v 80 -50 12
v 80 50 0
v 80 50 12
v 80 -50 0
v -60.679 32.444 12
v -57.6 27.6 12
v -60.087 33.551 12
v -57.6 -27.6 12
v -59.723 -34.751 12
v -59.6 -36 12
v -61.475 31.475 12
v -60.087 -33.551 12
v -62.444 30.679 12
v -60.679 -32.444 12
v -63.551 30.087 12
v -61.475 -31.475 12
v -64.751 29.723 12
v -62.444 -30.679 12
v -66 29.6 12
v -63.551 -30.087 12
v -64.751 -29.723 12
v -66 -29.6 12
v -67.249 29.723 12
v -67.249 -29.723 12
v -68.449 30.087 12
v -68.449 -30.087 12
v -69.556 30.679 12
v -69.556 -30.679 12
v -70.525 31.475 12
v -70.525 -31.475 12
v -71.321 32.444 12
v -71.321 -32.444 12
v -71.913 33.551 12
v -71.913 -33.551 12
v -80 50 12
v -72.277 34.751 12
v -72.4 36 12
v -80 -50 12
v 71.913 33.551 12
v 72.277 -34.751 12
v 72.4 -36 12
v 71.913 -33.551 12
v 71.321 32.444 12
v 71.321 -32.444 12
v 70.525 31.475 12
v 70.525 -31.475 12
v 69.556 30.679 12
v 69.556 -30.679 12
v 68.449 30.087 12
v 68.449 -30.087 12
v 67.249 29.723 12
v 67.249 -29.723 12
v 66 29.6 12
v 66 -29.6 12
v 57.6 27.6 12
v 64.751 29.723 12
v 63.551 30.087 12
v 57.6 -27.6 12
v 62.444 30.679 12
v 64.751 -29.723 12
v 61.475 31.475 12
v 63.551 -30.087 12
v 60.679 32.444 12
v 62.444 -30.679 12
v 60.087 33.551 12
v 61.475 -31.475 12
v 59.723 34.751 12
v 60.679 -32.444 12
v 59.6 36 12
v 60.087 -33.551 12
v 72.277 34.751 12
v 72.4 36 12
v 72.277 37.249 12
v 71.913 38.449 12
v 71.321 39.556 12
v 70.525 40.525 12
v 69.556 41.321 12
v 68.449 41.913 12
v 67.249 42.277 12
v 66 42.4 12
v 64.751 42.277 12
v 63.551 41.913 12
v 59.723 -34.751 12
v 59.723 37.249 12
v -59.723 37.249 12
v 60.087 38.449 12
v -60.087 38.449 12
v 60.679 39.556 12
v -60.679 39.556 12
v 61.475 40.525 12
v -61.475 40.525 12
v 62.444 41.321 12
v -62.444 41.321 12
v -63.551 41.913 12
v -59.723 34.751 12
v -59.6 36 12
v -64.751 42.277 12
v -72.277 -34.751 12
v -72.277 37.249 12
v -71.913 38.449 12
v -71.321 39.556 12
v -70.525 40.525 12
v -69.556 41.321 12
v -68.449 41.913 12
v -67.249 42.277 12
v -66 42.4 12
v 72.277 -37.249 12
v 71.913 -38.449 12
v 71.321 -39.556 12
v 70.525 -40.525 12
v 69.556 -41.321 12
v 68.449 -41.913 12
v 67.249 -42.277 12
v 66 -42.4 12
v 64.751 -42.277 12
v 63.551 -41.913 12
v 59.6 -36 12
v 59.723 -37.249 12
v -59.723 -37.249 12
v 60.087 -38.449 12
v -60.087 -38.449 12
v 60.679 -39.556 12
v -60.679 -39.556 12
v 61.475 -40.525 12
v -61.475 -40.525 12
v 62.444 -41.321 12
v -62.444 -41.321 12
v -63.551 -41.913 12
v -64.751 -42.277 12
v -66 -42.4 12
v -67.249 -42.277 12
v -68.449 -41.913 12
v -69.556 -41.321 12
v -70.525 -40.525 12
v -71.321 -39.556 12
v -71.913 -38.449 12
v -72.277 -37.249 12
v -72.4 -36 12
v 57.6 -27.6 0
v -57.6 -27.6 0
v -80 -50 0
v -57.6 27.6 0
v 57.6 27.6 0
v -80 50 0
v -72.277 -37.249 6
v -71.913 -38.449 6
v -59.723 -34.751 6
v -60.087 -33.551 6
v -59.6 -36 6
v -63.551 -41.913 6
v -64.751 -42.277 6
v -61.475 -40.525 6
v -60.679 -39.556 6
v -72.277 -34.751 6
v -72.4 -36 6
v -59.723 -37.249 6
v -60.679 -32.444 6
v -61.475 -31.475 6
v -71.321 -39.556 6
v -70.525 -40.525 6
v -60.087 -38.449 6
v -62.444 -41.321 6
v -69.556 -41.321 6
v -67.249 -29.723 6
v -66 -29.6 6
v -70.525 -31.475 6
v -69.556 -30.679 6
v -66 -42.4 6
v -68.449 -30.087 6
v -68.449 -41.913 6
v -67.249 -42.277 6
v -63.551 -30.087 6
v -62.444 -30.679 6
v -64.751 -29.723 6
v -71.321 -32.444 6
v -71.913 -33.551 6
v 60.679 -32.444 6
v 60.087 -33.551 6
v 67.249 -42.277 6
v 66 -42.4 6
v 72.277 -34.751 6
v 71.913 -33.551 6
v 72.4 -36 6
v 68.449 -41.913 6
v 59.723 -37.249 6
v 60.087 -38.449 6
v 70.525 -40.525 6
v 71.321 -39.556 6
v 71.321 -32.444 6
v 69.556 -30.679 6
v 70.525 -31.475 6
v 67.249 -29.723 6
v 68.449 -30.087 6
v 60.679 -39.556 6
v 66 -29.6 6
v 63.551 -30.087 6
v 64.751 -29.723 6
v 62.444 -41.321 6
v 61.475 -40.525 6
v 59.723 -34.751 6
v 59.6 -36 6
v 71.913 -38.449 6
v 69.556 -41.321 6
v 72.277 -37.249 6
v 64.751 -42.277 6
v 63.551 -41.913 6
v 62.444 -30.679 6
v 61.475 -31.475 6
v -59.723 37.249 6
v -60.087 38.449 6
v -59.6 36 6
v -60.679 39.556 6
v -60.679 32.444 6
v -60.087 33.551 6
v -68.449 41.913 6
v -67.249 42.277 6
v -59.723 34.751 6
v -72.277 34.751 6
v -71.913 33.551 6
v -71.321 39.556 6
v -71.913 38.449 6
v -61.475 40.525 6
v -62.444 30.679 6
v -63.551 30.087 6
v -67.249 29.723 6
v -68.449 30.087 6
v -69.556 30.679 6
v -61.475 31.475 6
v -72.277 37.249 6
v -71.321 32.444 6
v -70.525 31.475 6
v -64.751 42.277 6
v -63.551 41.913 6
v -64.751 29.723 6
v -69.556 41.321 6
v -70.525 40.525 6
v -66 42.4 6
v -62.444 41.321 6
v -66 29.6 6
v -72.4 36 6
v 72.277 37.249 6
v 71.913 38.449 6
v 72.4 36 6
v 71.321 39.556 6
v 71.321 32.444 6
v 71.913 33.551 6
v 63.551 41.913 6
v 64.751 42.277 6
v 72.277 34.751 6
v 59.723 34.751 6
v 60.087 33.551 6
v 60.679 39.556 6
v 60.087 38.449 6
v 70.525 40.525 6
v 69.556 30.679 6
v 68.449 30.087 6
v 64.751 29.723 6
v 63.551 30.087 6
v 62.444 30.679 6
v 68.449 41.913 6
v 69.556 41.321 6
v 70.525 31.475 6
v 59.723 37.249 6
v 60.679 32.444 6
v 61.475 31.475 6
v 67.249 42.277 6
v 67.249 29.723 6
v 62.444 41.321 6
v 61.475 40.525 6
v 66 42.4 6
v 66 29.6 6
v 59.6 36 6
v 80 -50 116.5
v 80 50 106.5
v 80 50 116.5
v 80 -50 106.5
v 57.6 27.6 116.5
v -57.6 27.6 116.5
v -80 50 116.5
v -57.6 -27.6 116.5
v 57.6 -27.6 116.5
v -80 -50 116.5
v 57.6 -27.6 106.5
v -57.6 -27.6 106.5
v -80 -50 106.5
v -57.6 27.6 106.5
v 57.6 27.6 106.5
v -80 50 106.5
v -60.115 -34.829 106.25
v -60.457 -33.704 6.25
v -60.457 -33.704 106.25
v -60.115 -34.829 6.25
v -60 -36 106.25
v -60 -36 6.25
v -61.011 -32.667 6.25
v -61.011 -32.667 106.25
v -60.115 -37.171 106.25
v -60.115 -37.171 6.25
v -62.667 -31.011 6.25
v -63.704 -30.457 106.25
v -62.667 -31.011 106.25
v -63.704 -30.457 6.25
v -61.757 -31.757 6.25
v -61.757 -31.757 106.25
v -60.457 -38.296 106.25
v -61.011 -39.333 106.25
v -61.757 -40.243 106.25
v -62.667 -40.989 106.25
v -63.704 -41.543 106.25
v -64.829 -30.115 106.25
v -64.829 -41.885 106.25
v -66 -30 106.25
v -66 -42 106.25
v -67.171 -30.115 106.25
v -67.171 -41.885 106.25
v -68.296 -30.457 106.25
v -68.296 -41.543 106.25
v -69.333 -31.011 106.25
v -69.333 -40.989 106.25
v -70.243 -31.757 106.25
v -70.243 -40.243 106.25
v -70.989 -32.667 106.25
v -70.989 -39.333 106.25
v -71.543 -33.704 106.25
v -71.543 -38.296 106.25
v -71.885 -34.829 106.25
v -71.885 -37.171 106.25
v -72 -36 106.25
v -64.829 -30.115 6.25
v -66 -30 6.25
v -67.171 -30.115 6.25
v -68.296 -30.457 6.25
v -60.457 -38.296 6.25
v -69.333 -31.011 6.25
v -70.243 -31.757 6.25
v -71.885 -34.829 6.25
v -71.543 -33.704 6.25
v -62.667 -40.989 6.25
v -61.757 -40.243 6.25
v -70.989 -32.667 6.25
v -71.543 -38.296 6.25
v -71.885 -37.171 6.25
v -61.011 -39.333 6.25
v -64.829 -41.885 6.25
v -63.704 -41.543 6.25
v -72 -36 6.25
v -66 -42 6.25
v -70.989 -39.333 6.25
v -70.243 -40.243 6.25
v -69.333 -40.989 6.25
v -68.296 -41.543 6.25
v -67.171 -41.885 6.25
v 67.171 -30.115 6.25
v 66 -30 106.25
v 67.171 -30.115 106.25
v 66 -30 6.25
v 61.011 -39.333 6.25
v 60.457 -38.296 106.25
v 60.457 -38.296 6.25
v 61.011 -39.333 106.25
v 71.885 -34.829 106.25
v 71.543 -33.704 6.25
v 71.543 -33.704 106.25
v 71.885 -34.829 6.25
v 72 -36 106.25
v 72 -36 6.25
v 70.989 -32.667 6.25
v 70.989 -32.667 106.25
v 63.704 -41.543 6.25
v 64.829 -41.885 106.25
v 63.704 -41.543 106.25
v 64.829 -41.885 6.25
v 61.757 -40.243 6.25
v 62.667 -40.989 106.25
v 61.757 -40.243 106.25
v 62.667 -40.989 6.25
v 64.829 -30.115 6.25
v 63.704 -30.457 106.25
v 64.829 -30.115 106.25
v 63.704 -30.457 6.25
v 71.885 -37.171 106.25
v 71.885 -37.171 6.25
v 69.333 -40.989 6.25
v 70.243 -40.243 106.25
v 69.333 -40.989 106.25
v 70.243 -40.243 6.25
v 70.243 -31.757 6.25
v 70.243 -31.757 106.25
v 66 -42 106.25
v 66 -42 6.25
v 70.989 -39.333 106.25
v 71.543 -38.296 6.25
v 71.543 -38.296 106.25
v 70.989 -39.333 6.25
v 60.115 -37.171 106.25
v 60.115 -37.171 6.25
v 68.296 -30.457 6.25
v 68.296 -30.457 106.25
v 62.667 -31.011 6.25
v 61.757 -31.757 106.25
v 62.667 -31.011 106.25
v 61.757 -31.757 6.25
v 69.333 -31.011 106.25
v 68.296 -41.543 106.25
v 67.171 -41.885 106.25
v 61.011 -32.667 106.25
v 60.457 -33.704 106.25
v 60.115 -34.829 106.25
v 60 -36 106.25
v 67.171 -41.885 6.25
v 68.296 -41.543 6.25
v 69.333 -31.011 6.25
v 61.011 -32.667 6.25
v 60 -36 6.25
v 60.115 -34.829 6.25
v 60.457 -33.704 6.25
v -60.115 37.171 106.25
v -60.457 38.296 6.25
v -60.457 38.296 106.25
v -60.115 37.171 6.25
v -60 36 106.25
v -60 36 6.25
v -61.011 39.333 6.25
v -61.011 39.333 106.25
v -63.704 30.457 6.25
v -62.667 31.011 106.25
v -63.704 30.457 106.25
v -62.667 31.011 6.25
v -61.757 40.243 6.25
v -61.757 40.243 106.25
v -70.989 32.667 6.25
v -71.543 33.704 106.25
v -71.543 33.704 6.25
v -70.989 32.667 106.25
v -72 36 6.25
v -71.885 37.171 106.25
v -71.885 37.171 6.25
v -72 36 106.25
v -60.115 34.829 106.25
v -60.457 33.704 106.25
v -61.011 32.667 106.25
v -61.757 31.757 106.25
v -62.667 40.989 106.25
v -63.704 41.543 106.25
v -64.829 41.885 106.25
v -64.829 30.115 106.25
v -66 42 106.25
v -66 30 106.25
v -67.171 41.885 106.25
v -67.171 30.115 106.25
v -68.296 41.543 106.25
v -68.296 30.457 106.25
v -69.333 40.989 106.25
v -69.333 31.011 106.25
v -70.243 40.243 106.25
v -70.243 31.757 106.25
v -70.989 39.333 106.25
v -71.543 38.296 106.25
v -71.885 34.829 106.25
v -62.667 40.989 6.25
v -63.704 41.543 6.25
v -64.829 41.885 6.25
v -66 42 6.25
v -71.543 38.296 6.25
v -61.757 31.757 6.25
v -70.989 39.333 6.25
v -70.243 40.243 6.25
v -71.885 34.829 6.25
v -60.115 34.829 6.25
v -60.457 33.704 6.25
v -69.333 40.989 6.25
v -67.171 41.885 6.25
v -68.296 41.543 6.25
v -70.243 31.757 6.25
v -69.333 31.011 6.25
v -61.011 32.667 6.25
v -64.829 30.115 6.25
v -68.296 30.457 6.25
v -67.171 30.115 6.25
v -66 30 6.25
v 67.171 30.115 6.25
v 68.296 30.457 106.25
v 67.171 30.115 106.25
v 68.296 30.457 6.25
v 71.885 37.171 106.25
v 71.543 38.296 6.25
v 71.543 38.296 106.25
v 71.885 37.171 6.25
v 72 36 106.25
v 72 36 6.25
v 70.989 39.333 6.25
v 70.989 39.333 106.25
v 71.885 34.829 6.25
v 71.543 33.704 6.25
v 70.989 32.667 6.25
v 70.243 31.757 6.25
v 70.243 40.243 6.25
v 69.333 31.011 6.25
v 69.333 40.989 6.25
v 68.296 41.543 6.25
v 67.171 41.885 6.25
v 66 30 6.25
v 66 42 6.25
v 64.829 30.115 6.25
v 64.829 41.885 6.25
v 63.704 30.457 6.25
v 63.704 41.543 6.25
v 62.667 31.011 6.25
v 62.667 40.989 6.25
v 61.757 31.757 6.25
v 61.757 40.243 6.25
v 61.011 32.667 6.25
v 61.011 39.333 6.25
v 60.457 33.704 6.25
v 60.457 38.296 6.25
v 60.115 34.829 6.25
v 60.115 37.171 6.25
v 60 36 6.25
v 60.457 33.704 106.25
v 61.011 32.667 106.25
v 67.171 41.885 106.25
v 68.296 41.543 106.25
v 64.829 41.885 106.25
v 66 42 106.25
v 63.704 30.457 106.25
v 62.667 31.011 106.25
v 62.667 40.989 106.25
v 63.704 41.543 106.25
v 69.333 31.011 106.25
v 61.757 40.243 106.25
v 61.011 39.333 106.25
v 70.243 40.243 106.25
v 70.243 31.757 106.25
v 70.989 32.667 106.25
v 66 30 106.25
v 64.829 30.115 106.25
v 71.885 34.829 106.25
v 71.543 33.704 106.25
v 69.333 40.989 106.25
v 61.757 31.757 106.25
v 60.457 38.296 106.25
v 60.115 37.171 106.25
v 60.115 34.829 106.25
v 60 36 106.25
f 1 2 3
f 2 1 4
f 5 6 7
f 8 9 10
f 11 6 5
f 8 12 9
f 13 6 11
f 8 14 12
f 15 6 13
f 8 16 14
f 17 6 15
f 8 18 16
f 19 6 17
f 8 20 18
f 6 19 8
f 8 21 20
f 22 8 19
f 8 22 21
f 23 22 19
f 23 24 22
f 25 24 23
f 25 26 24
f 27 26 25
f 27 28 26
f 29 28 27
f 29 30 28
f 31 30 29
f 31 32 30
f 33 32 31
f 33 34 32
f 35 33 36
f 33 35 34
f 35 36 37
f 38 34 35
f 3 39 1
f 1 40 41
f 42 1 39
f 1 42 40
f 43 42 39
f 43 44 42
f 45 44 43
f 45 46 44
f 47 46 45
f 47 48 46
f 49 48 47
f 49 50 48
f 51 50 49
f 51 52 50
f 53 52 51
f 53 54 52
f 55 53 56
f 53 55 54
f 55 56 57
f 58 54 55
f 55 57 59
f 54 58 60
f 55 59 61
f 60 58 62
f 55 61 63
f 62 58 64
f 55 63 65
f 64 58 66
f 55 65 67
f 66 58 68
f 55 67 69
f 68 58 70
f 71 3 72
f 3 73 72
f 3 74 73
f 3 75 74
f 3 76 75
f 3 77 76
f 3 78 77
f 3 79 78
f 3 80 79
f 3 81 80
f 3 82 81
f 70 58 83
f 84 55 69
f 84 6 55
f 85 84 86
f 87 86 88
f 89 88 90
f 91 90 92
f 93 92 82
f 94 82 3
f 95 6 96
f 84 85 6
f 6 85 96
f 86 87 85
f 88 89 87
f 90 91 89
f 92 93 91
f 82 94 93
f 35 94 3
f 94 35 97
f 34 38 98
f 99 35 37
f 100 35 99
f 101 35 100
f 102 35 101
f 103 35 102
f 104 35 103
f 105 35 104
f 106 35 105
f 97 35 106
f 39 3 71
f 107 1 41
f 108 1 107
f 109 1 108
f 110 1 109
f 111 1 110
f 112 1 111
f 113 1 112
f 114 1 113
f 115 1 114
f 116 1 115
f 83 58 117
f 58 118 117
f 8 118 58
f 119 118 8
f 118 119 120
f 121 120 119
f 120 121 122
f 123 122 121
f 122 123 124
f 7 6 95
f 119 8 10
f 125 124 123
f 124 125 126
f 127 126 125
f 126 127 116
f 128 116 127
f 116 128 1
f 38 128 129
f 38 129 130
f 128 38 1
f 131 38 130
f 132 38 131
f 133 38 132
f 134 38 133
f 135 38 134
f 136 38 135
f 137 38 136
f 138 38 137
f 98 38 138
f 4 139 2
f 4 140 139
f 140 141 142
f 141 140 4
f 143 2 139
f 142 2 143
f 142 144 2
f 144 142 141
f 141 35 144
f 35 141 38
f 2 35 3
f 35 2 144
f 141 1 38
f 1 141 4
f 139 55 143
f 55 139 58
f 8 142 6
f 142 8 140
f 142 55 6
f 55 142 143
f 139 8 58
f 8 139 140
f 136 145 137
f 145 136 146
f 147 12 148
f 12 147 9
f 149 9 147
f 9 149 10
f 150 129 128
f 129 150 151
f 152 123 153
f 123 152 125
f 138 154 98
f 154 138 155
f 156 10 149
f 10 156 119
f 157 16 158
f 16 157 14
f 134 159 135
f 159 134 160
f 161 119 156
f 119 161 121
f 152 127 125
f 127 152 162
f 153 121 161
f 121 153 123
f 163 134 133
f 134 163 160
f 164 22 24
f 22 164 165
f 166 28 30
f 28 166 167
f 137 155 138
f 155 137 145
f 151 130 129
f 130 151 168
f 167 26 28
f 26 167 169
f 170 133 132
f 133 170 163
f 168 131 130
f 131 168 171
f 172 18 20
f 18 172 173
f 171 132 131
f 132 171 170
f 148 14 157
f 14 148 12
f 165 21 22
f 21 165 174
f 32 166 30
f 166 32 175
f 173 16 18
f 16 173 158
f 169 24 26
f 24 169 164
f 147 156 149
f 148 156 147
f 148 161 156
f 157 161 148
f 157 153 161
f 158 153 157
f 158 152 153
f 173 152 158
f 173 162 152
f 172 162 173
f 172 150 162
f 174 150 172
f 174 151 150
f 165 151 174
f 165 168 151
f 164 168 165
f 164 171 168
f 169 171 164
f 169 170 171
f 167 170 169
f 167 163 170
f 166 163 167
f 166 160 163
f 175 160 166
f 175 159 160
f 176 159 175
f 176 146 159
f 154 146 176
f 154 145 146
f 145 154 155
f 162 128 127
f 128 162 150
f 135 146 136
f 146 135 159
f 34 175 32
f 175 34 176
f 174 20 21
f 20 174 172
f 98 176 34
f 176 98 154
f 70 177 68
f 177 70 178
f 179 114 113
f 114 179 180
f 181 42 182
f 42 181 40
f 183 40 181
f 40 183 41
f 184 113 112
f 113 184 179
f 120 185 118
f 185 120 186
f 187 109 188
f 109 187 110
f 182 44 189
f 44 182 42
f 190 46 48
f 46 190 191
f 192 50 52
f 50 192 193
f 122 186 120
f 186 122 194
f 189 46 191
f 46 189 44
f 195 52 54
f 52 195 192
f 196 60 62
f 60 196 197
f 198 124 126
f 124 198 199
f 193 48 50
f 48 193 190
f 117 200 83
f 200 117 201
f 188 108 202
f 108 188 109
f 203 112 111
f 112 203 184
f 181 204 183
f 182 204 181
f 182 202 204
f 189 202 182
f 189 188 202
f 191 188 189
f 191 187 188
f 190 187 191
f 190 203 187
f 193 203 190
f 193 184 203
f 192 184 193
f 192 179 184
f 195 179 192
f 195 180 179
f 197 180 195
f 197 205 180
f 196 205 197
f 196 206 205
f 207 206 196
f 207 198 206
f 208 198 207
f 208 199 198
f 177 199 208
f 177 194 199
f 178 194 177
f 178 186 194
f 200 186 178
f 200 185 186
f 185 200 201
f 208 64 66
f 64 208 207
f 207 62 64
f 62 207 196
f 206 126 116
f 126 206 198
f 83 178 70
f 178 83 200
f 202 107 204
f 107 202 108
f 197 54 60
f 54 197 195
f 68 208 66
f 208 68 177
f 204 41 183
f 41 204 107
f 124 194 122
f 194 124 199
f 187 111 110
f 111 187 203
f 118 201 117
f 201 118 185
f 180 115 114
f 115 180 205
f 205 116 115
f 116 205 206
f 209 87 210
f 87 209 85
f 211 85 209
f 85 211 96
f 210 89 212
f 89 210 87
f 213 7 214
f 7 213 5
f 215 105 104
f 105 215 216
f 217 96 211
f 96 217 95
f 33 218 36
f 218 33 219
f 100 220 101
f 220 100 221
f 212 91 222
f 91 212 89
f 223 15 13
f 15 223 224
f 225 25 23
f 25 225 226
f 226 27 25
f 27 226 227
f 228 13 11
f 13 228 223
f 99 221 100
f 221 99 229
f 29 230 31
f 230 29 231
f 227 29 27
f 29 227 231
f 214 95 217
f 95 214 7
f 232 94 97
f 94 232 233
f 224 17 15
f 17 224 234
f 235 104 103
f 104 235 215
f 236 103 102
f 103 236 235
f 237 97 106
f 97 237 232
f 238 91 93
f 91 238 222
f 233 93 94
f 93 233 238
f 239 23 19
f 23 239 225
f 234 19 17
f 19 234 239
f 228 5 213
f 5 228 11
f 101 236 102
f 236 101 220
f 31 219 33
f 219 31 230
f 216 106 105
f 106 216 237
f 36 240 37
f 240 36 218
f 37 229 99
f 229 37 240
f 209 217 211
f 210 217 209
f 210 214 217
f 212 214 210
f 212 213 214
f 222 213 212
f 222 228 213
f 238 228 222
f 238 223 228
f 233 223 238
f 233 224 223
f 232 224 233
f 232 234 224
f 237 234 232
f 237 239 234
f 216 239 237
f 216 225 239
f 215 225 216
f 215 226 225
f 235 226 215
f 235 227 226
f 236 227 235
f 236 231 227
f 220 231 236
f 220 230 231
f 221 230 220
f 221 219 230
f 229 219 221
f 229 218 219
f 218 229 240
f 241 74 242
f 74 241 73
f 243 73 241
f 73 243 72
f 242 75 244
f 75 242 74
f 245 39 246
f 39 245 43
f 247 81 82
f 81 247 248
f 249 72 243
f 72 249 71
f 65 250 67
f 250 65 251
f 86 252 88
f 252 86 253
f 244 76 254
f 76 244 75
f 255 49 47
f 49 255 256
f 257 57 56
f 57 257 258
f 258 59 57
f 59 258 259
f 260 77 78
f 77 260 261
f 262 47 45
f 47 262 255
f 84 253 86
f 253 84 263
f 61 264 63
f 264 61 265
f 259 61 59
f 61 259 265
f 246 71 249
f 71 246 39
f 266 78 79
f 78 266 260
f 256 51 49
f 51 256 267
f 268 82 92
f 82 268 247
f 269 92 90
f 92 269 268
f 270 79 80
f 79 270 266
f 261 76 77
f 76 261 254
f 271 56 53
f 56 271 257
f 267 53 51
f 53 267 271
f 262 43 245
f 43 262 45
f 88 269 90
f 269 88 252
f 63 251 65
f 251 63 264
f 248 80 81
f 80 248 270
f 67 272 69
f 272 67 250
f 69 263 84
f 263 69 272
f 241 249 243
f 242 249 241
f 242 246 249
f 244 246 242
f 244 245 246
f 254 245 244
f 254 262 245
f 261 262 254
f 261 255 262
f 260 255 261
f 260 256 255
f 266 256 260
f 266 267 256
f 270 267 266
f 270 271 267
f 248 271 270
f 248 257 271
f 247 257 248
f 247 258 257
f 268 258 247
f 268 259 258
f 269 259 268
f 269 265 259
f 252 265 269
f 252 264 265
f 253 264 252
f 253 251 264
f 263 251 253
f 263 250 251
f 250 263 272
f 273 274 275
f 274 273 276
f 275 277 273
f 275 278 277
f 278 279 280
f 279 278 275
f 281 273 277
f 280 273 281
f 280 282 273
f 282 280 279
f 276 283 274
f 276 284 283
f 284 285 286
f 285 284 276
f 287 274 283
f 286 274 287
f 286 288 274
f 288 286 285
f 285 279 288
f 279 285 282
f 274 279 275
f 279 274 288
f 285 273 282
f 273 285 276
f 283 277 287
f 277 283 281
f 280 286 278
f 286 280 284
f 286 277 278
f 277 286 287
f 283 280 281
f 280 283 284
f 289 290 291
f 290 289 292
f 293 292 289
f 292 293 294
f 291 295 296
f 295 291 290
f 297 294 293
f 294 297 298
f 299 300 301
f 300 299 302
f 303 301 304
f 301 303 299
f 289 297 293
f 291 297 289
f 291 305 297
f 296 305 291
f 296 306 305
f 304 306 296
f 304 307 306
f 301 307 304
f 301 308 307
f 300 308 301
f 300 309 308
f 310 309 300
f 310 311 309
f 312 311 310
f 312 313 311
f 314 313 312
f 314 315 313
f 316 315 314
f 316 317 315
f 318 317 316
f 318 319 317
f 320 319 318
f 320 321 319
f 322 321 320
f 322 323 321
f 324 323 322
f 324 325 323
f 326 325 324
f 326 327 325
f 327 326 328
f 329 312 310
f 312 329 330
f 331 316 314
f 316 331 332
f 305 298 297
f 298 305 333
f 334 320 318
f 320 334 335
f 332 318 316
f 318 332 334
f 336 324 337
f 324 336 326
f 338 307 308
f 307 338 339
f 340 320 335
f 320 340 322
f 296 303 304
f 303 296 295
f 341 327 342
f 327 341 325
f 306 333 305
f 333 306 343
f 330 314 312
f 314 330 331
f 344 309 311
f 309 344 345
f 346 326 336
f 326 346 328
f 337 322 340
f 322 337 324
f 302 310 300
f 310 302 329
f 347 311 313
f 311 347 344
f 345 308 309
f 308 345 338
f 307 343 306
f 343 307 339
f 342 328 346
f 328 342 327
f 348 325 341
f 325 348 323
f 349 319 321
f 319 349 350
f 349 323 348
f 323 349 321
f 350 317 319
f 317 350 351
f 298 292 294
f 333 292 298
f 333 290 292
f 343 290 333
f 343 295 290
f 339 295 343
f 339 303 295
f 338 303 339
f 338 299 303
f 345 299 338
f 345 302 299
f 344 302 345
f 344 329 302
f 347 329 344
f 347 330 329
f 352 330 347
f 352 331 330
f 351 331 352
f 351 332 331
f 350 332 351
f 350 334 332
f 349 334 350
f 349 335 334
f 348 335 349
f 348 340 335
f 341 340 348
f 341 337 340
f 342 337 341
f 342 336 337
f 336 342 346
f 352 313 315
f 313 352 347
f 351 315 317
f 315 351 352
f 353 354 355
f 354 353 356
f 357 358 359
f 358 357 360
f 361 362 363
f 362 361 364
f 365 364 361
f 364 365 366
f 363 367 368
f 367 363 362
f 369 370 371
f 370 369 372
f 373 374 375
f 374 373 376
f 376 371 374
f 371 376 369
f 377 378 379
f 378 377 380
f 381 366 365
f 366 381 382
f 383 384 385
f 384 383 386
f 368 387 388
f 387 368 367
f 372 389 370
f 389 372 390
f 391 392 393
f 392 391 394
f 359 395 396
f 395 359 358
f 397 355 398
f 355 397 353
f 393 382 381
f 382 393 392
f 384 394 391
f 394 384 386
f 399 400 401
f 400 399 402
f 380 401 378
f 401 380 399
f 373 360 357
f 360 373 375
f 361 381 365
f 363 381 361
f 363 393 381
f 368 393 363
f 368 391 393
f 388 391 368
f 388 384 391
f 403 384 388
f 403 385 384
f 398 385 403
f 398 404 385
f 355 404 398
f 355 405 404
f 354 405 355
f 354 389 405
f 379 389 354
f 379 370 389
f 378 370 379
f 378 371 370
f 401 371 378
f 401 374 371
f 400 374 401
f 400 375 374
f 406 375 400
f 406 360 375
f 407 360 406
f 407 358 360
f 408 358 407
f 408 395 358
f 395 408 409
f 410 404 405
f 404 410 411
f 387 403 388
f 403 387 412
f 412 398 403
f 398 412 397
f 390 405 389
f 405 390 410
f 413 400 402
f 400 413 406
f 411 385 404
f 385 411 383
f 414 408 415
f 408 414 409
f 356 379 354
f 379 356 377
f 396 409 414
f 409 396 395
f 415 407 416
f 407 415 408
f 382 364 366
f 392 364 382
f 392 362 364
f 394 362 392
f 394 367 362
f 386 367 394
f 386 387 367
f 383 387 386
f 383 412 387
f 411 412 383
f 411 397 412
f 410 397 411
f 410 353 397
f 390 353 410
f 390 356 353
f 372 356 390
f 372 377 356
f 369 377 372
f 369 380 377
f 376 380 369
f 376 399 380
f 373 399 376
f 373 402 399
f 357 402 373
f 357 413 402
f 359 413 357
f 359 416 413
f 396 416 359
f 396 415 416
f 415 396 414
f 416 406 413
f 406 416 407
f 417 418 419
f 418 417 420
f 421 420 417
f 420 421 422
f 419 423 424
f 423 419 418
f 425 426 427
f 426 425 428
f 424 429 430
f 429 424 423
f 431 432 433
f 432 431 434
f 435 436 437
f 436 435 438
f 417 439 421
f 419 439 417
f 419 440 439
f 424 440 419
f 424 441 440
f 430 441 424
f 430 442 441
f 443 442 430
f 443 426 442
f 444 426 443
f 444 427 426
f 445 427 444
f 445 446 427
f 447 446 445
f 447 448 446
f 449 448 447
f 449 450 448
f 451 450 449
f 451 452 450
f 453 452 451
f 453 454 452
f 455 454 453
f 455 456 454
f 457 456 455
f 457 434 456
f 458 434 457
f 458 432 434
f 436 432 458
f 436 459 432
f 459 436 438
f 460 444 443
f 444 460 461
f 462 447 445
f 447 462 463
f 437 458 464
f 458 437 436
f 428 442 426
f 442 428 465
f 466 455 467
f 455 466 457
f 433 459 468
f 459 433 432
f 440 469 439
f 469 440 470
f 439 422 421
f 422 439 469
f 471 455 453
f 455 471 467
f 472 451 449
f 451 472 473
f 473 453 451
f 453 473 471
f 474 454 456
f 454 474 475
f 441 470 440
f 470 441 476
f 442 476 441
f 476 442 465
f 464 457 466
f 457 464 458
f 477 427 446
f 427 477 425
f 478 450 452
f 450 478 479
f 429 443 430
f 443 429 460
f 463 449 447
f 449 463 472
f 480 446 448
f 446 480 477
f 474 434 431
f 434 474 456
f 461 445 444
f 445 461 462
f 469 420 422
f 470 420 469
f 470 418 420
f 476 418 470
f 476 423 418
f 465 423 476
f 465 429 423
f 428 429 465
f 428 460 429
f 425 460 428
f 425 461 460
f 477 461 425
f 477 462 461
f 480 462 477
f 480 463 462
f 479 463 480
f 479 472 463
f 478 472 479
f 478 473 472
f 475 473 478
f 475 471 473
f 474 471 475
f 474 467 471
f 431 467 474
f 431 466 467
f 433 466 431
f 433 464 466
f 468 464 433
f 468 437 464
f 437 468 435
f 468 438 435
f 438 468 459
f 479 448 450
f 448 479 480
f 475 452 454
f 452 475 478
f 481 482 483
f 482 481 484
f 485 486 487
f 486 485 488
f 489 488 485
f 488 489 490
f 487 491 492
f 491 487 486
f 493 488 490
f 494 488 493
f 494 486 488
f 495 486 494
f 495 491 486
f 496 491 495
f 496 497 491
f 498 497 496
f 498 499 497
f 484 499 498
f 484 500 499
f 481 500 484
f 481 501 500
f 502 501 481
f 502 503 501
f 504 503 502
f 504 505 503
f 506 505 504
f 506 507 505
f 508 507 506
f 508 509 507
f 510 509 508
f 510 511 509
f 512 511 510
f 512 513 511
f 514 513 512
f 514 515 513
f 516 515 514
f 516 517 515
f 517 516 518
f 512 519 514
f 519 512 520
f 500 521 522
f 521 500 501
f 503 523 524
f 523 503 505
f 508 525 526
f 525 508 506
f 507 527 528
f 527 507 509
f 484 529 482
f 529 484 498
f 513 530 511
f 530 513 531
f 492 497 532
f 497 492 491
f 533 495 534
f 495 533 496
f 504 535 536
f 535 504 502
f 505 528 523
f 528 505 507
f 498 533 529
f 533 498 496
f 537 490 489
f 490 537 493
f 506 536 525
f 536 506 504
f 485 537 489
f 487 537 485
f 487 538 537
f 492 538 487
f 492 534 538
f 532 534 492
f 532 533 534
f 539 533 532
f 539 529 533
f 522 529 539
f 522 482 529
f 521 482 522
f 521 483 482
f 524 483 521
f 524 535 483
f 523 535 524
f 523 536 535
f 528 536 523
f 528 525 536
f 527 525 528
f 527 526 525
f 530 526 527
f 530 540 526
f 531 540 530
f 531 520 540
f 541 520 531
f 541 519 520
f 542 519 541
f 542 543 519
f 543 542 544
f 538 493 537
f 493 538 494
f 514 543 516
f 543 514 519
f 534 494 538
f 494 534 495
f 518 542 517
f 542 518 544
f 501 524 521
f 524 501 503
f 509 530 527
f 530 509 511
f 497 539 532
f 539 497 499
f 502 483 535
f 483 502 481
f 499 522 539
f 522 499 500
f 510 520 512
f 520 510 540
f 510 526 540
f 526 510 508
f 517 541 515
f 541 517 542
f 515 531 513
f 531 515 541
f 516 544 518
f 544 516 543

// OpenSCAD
$fn = 32;

// ------------------------------------------------------------------------
// Frame cube: base 160 x 100 mm, posts 100 mm tall
// Every part is its own module, assembly() places every instance.
// ------------------------------------------------------------------------

// --- part 1 ---
module base_frame() {
  difference() {
    translate([-80, -50, 0]) cube([160, 100, 12]);
    translate([-57.6, -27.6, -1]) cube([115.2, 55.2, 14]);
    translate([-66, -36, 6]) cylinder(h = 7, d = 12.8);
    translate([66, -36, 6]) cylinder(h = 7, d = 12.8);
    translate([-66, 36, 6]) cylinder(h = 7, d = 12.8);
    translate([66, 36, 6]) cylinder(h = 7, d = 12.8);
  }
}

// --- part 2 ---
module corner_post() {
  cylinder(h = 100, d = 12);
}

// --- part 3 ---
module top_frame() {
  difference() {
    translate([-80, -50, 0]) cube([160, 100, 10]);
    translate([-57.6, -27.6, -1]) cube([115.2, 55.2, 12]);
  }
}

// --- assembly ---
module assembly() {
  color([0.80, 0.24, 0.20]) translate([0, 0, 0]) rotate([0, 0, 0]) base_frame();
  color([0.20, 0.45, 0.75]) translate([-66, -36, 6.25]) rotate([0, 0, 0]) corner_post();
  color([0.25, 0.62, 0.32]) translate([66, -36, 6.25]) rotate([0, 0, 0]) corner_post();
  color([0.92, 0.70, 0.18]) translate([-66, 36, 6.25]) rotate([0, 0, 0]) corner_post();
  color([0.58, 0.35, 0.70]) translate([66, 36, 6.25]) rotate([0, 0, 0]) corner_post();
  color([0.16, 0.66, 0.66]) translate([0, 0, 106.5]) rotate([0, 0, 0]) top_frame();
}

assembly();
